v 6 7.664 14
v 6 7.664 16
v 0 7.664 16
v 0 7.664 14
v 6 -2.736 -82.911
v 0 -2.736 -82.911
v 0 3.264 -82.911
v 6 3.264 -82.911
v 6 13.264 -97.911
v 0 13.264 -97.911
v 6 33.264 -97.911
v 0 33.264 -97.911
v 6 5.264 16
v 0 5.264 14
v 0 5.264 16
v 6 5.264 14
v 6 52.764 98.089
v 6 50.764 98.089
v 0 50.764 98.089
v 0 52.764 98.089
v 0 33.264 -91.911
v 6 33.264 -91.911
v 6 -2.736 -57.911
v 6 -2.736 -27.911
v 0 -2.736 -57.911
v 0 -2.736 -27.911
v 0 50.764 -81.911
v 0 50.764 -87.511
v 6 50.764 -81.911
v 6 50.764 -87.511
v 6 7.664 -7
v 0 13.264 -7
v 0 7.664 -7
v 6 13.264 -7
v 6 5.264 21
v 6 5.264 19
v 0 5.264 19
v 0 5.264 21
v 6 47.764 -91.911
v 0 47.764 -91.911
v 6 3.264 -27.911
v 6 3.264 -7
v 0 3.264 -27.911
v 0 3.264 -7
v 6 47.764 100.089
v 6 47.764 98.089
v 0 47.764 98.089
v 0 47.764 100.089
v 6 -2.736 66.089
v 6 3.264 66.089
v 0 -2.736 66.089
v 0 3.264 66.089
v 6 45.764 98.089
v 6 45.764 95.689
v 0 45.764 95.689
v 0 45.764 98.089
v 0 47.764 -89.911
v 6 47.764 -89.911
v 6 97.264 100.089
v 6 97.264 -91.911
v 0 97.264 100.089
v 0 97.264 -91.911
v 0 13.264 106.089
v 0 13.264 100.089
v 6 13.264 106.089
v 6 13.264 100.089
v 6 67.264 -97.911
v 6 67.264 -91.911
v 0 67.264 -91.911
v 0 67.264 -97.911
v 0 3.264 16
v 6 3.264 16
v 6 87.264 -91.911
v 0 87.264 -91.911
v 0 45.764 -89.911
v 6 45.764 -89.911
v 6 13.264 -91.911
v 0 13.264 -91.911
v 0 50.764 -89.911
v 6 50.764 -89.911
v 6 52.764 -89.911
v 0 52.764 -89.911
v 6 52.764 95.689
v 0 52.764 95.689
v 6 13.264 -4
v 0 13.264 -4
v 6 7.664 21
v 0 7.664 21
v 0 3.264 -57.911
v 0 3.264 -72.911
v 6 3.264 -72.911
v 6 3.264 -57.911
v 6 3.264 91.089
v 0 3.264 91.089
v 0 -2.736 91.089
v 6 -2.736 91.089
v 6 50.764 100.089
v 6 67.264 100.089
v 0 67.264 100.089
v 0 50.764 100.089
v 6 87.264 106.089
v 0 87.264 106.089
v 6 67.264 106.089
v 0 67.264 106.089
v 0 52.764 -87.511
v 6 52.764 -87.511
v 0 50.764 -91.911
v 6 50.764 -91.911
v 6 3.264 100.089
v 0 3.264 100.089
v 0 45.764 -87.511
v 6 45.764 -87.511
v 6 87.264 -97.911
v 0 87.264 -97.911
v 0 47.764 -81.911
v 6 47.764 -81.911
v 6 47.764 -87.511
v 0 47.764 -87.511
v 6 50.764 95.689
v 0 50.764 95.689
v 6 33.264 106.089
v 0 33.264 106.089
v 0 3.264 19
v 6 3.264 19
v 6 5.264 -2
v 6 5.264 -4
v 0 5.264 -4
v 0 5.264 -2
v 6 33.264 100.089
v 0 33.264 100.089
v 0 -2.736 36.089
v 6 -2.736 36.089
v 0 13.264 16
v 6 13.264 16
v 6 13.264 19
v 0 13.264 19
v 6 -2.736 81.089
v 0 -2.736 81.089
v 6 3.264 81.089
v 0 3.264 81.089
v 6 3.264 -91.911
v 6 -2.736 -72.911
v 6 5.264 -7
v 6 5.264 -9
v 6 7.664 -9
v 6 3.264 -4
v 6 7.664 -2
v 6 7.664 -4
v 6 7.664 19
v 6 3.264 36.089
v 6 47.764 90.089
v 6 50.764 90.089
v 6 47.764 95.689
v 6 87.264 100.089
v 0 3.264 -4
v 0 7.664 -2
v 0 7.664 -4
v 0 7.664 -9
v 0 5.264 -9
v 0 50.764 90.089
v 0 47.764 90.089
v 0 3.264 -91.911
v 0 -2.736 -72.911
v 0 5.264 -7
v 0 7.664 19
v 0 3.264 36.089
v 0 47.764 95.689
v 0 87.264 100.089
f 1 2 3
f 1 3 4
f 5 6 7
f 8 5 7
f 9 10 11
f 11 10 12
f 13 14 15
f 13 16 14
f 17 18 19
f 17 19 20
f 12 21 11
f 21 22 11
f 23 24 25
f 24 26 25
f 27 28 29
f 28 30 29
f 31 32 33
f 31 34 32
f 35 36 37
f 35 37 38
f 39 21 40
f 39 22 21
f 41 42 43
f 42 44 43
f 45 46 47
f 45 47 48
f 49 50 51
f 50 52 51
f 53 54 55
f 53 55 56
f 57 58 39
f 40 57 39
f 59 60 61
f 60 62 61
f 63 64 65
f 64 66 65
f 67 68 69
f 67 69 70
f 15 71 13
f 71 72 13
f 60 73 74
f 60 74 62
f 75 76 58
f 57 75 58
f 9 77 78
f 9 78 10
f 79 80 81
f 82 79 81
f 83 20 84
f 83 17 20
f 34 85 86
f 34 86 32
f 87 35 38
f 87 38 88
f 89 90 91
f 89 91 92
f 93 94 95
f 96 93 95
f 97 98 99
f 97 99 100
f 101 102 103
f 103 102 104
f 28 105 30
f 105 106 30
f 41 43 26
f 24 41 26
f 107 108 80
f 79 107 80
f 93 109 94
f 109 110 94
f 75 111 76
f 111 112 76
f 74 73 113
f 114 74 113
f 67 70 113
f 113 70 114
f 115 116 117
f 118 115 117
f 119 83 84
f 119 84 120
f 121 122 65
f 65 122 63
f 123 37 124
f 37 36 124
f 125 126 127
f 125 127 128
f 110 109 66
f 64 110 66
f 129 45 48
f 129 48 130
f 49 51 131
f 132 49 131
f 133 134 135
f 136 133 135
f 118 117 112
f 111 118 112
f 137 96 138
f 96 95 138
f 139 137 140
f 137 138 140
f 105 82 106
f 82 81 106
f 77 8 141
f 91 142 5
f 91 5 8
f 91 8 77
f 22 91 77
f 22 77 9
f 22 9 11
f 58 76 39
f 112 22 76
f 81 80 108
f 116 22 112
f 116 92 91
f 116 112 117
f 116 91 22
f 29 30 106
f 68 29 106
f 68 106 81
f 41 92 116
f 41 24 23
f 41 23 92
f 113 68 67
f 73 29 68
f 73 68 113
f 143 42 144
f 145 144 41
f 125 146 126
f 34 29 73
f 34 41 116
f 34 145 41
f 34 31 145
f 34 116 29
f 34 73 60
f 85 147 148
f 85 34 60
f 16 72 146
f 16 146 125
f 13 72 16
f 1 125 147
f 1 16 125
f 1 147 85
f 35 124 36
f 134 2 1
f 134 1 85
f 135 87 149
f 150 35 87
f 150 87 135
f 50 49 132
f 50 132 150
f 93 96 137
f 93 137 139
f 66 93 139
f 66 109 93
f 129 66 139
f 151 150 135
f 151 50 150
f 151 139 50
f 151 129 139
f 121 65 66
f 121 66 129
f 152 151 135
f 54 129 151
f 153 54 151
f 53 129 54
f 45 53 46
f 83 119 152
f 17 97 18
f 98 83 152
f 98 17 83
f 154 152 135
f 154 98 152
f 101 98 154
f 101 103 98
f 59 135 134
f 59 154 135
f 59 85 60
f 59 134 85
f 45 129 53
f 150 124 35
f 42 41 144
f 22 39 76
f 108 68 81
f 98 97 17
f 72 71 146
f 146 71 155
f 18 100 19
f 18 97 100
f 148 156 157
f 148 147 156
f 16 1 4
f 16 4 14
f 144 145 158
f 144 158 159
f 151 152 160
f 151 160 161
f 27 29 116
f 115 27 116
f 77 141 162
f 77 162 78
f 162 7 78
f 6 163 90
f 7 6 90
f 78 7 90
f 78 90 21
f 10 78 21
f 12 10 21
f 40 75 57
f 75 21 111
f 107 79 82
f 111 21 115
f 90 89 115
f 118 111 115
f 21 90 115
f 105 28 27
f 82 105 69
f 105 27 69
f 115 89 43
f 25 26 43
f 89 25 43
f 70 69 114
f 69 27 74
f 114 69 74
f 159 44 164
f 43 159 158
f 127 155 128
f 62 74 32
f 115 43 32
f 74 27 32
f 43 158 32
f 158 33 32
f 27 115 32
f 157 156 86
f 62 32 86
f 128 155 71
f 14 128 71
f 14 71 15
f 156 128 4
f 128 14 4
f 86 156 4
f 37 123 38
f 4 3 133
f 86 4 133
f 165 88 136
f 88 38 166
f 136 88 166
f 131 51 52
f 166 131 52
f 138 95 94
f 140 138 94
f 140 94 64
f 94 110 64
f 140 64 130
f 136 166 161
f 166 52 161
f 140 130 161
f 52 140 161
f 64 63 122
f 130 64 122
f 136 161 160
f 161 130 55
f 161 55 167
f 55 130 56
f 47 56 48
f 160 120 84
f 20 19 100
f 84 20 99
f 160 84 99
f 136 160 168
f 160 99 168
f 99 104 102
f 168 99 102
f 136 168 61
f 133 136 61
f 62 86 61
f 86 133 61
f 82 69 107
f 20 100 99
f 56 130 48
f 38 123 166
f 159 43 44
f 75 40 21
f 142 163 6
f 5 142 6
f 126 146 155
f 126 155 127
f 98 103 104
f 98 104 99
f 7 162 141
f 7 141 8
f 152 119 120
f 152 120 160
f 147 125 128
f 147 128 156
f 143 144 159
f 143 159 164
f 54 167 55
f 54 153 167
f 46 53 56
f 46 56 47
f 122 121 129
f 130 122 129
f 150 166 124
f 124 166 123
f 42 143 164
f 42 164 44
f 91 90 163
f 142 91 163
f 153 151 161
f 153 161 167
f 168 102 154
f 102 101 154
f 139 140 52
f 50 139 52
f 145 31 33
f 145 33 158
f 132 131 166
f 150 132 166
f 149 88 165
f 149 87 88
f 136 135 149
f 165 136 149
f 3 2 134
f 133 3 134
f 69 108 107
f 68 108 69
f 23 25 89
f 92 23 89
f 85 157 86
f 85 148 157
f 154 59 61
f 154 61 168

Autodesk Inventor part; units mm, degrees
ref_plane "YZ Plane" through (0, 0, 0) normal (1, 0, 0) x (0, 1, 0)
ref_plane "XZ Plane" through (0, 0, 0) normal (0, 1, 0) x (-1, 0, 0)
ref_plane "XY Plane" through (0, 0, 0) normal (0, 0, 1) x (1, 0, 0)
sketch "Эскиз1" plane through (0, 0, 0) normal (1, 0, 0) x (0, 1, 0)
  line L0 (97.2644, 106.089) -> (-2.7356, 106.089)
  line L1 (-2.7356, 106.089) -> (-2.7356, -97.911)
  line L2 (-2.7356, -97.911) -> (97.2644, -97.911)
  line L3 (97.2644, -97.911) -> (97.2644, 106.089)
  line L4 (-2.7356, 106.089) -> (3.2644, 106.089)
  line L5 (3.2644, 106.089) -> (3.2644, 66.089)
  line L6 (3.2644, 66.089) -> (-2.7356, 66.089)
  line L7 (-2.7356, 66.089) -> (-2.7356, 106.089)
  line L8 (3.2644, 66.089) -> (-2.7356, 66.089)
  line L9 (-2.7356, 66.089) -> (-2.7356, 36.089)
  line L10 (-2.7356, 36.089) -> (3.2644, 36.089)
  line L11 (3.2644, 36.089) -> (3.2644, 66.089)
  line L12 (-2.7356, 36.089) -> (3.2644, 36.089)
  line L13 (3.2644, 36.089) -> (3.2644, -27.911)
  line L14 (3.2644, -27.911) -> (-2.7356, -27.911)
  line L15 (-2.7356, -27.911) -> (-2.7356, 36.089)
  line L16 (3.2644, -27.911) -> (-2.7356, -27.911)
  line L17 (-2.7356, -27.911) -> (-2.7356, -57.911)
  line L18 (-2.7356, -57.911) -> (3.2644, -57.911)
  line L19 (3.2644, -57.911) -> (3.2644, -27.911)
  line L20 (3.2644, -57.911) -> (-2.7356, -57.911)
  line L21 (-2.7356, -57.911) -> (-2.7356, -97.911)
  line L22 (-2.7356, -97.911) -> (3.2644, -97.911)
  line L23 (3.2644, -97.911) -> (3.2644, -57.911)
  line L24 (3.2644, 91.089) -> (-2.7356, 91.089)
  line L25 (-2.7356, 91.089) -> (-2.7356, 81.089)
  line L26 (-2.7356, 81.089) -> (3.2644, 81.089)
  line L27 (3.2644, 81.089) -> (3.2644, 91.089)
  line L28 (3.2644, -72.911) -> (-2.7356, -72.911)
  line L29 (-2.7356, -72.911) -> (-2.7356, -82.911)
  line L30 (-2.7356, -82.911) -> (3.2644, -82.911)
  line L31 (3.2644, -82.911) -> (3.2644, -72.911)
  point P0 (0, 0)
  point P1 (-2.7356, 66.089)
  point P2 (3.2644, 36.089)
  point P3 (-2.7356, -27.911)
  point P4 (0.2644, 91.089)
  point P5 (0.2644, 81.089)
  point P6 (0.2644, 66.089)
  point P7 (0.2644, -57.911)
  point P8 (0.2644, -72.911)
  point P9 (0.2644, -82.911)
  dimension "d0" = 204
  dimension "d1" = 100
  dimension "d2" = 40
  dimension "d3" = 30
  dimension "d4" = 30
  dimension "d5" = 40
  dimension "d8" = 6
  dimension "d41" = 10
  dimension "d42" = 15
  dimension "d43" = 15
  dimension "d44" = 10
extrude "Выдавливание1" add sketch "Эскиз1" along normal blind 6 contours L3 L2 L23 L19 L13 L11 L5 L0 | L5 L26 L1 L24 | L30 L1 L28 L23 | L11 L10 L1 L6 | L18 L1 L14 L19
sketch "Эскиз2" plane through (6, 0, 0) normal (1, 0, 0) x (0, 0, -1)
  line L0 (-106.089, 97.2644) -> (-106.089, 3.2644) projected
  line L1 (-106.089, 3.2644) -> (-100.089, 3.2644)
  line L2 (-100.089, 3.2644) -> (-100.089, 13.2644)
  line L3 (-100.089, 13.2644) -> (-106.089, 13.2644)
  line L4 (-106.089, 13.2644) -> (-106.089, 3.2644)
  line L5 (-106.089, 33.2644) -> (-100.089, 33.2644)
  line L6 (-100.089, 33.2644) -> (-100.089, 13.2644)
  line L7 (-100.089, 13.2644) -> (-106.089, 13.2644)
  line L8 (-106.089, 13.2644) -> (-106.089, 33.2644)
  line L9 (-100.089, 33.2644) -> (-106.089, 33.2644)
  line L10 (-106.089, 33.2644) -> (-106.089, 67.2644)
  line L11 (-106.089, 67.2644) -> (-100.089, 67.2644)
  line L12 (-100.089, 67.2644) -> (-100.089, 33.2644)
  line L13 (-100.089, 67.2644) -> (-106.089, 67.2644)
  line L14 (-106.089, 67.2644) -> (-106.089, 87.2644)
  line L15 (-106.089, 87.2644) -> (-100.089, 87.2644)
  line L16 (-100.089, 87.2644) -> (-100.089, 67.2644)
  line L17 (-100.089, 87.2644) -> (-106.089, 87.2644)
  line L18 (-106.089, 87.2644) -> (-106.089, 97.2644)
  line L19 (-106.089, 97.2644) -> (-100.089, 97.2644)
  line L20 (-100.089, 97.2644) -> (-100.089, 87.2644)
  line L21 (57.911, 3.2644) -> (97.911, 3.2644) projected
  line L22 (97.911, 3.2644) -> (91.911, 3.2644)
  line L23 (91.911, 3.2644) -> (91.911, 13.2644)
  line L24 (91.911, 13.2644) -> (97.911, 13.2644)
  line L25 (97.911, 13.2644) -> (97.911, 3.2644)
  line L26 (97.911, 13.2644) -> (91.911, 13.2644)
  line L27 (91.911, 13.2644) -> (91.911, 33.2644)
  line L28 (91.911, 33.2644) -> (97.911, 33.2644)
  line L29 (97.911, 33.2644) -> (97.911, 13.2644)
  line L30 (97.911, 33.2644) -> (91.911, 33.2644)
  line L31 (91.911, 33.2644) -> (91.911, 67.2644)
  line L32 (91.911, 67.2644) -> (97.911, 67.2644)
  line L33 (97.911, 67.2644) -> (97.911, 33.2644)
  line L34 (97.911, 67.2644) -> (91.911, 67.2644)
  line L35 (91.911, 67.2644) -> (91.911, 87.2644)
  line L36 (91.911, 87.2644) -> (97.911, 87.2644)
  line L37 (97.911, 87.2644) -> (97.911, 67.2644)
  line L38 (97.911, 87.2644) -> (91.911, 87.2644)
  line L39 (91.911, 87.2644) -> (91.911, 97.2644)
  line L40 (91.911, 97.2644) -> (97.911, 97.2644)
  line L41 (97.911, 97.2644) -> (97.911, 87.2644)
  point P0 (0, 0)
  point P1 (91.911, 3.2644)
  dimension "d9" = 10
  dimension "d10" = 20
  dimension "d11" = 10
  dimension "d12" = 20
  dimension "d13" = 34
  dimension "d14" = 6
  dimension "d15" = 10
  dimension "d16" = 20
  dimension "d17" = 20
  dimension "d18" = 10
  dimension "d19" = 34
  dimension "d20" = 6
extrude "Выдавливание2" cut sketch "Эскиз2" against normal through all contours L19 L20 L15 L0 | L11 L12 L5 L0 | L3 L2 L1 L0 | L23 L24 L25 L21 | L31 L32 L33 L28 | L39 L40 L41 L36
sketch "Эскиз4" plane through (6, 0, 0) normal (1, 0, 0) x (0, 0, -1)
  line L0 (-36.089, 3.2644) -> (27.911, 3.2644) projected
  line L1 (-19, 3.2644) -> (-16, 3.2644)
  line L2 (-16, 3.2644) -> (-16, 13.2644)
  line L3 (-16, 13.2644) -> (-19, 13.2644)
  line L4 (-19, 13.2644) -> (-19, 3.2644)
  line L5 (-21, 7.6644) -> (-14, 7.6644)
  line L6 (-14, 7.6644) -> (-14, 5.2644)
  line L7 (-14, 5.2644) -> (-21, 5.2644)
  line L8 (-21, 5.2644) -> (-21, 7.6644)
  line L9 (7, 3.2644) -> (4, 3.2644)
  line L10 (4, 3.2644) -> (4, 13.2644)
  line L11 (4, 13.2644) -> (7, 13.2644)
  line L12 (7, 13.2644) -> (7, 3.2644)
  line L13 (2, 7.6644) -> (9, 7.6644)
  line L14 (9, 7.6644) -> (9, 5.2644)
  line L15 (9, 5.2644) -> (2, 5.2644)
  line L16 (2, 5.2644) -> (2, 7.6644)
  point P0 (0, 0)
  point P1 (4, 5.2644)
  point P2 (4, 3.2644)
  point P3 (7, 5.2644)
  point P4 (7, 7.6644)
  point P5 (4, 7.6644)
  point P6 (-19, 5.2644)
  point P7 (-16, 3.2644)
  point P8 (-16, 5.2644)
  point P9 (-16, 7.6644)
  point P10 (-19, 7.6644)
  dimension "d26" = 7
  dimension "d27" = 7
  dimension "d28" = 2
  dimension "d29" = 3
  dimension "d30" = 2.4
  dimension "d31" = 10
  dimension "d32" = 16
  dimension "d33" = 2
  dimension "d34" = 2.4
  dimension "d35" = 2
  dimension "d36" = 3
  dimension "d37" = 10
  dimension "d38" = 4
extrude "Выдавливание4" cut sketch "Эскиз4" against normal blind 6.25
sketch "Эскиз6" plane through (6, 0, 0) normal (1, 0, 0) x (0, 0, -1)
  line L0 (91.911, 97.2644) -> (-100.089, 97.2644) projected
  line L1 (-4.089, 97.2644) -> (-4.089, 61.7663)
  line L2 (-100.089, 67.2644) -> (-100.089, 33.2644) projected
  line L3 (-100.089, 50.7644) -> (-90.089, 50.7644)
  line L4 (-90.089, 50.7644) -> (-90.089, 47.7644)
  line L5 (-90.089, 47.7644) -> (-100.089, 47.7644)
  line L6 (-100.089, 47.7644) -> (-100.089, 50.7644)
  line L7 (-98.089, 52.7644) -> (-95.689, 52.7644)
  line L8 (-95.689, 52.7644) -> (-95.689, 45.7644)
  line L9 (-95.689, 45.7644) -> (-98.089, 45.7644)
  line L10 (-98.089, 45.7644) -> (-98.089, 52.7644)
  line L11 (-91.089, -2.7356) -> (-81.089, -2.7356) projected
  line L12 (91.911, 50.7644) -> (81.911, 50.7644)
  line L13 (81.911, 50.7644) -> (81.911, 47.7644)
  line L14 (81.911, 47.7644) -> (91.911, 47.7644)
  line L15 (91.911, 47.7644) -> (91.911, 50.7644)
  line L16 (89.911, 52.7644) -> (87.511, 52.7644)
  line L17 (87.511, 52.7644) -> (87.511, 45.7644)
  line L18 (87.511, 45.7644) -> (89.911, 45.7644)
  line L19 (89.911, 45.7644) -> (89.911, 52.7644)
  point P0 (0, 0)
  point P1 (-96.889, 45.7644)
  point P2 (88.711, 45.7644)
  point P3 (89.911, 47.7644)
  point P4 (89.911, 50.7644)
  point P5 (87.511, 50.7644)
  point P6 (87.511, 47.7644)
  point P7 (-98.089, 50.7644)
  point P8 (-98.089, 47.7644)
  point P9 (-95.689, 47.7644)
  point P10 (-95.689, 50.7644)
  dimension "d45" = 7
  dimension "d46" = 3
  dimension "d47" = 2.4
  dimension "d48" = 2
  dimension "d49" = 2
  dimension "d50" = 10
  dimension "d51" = 50.5
extrude "Выдавливание5" cut sketch "Эскиз6" against normal blind 6
properties part number "перед"
